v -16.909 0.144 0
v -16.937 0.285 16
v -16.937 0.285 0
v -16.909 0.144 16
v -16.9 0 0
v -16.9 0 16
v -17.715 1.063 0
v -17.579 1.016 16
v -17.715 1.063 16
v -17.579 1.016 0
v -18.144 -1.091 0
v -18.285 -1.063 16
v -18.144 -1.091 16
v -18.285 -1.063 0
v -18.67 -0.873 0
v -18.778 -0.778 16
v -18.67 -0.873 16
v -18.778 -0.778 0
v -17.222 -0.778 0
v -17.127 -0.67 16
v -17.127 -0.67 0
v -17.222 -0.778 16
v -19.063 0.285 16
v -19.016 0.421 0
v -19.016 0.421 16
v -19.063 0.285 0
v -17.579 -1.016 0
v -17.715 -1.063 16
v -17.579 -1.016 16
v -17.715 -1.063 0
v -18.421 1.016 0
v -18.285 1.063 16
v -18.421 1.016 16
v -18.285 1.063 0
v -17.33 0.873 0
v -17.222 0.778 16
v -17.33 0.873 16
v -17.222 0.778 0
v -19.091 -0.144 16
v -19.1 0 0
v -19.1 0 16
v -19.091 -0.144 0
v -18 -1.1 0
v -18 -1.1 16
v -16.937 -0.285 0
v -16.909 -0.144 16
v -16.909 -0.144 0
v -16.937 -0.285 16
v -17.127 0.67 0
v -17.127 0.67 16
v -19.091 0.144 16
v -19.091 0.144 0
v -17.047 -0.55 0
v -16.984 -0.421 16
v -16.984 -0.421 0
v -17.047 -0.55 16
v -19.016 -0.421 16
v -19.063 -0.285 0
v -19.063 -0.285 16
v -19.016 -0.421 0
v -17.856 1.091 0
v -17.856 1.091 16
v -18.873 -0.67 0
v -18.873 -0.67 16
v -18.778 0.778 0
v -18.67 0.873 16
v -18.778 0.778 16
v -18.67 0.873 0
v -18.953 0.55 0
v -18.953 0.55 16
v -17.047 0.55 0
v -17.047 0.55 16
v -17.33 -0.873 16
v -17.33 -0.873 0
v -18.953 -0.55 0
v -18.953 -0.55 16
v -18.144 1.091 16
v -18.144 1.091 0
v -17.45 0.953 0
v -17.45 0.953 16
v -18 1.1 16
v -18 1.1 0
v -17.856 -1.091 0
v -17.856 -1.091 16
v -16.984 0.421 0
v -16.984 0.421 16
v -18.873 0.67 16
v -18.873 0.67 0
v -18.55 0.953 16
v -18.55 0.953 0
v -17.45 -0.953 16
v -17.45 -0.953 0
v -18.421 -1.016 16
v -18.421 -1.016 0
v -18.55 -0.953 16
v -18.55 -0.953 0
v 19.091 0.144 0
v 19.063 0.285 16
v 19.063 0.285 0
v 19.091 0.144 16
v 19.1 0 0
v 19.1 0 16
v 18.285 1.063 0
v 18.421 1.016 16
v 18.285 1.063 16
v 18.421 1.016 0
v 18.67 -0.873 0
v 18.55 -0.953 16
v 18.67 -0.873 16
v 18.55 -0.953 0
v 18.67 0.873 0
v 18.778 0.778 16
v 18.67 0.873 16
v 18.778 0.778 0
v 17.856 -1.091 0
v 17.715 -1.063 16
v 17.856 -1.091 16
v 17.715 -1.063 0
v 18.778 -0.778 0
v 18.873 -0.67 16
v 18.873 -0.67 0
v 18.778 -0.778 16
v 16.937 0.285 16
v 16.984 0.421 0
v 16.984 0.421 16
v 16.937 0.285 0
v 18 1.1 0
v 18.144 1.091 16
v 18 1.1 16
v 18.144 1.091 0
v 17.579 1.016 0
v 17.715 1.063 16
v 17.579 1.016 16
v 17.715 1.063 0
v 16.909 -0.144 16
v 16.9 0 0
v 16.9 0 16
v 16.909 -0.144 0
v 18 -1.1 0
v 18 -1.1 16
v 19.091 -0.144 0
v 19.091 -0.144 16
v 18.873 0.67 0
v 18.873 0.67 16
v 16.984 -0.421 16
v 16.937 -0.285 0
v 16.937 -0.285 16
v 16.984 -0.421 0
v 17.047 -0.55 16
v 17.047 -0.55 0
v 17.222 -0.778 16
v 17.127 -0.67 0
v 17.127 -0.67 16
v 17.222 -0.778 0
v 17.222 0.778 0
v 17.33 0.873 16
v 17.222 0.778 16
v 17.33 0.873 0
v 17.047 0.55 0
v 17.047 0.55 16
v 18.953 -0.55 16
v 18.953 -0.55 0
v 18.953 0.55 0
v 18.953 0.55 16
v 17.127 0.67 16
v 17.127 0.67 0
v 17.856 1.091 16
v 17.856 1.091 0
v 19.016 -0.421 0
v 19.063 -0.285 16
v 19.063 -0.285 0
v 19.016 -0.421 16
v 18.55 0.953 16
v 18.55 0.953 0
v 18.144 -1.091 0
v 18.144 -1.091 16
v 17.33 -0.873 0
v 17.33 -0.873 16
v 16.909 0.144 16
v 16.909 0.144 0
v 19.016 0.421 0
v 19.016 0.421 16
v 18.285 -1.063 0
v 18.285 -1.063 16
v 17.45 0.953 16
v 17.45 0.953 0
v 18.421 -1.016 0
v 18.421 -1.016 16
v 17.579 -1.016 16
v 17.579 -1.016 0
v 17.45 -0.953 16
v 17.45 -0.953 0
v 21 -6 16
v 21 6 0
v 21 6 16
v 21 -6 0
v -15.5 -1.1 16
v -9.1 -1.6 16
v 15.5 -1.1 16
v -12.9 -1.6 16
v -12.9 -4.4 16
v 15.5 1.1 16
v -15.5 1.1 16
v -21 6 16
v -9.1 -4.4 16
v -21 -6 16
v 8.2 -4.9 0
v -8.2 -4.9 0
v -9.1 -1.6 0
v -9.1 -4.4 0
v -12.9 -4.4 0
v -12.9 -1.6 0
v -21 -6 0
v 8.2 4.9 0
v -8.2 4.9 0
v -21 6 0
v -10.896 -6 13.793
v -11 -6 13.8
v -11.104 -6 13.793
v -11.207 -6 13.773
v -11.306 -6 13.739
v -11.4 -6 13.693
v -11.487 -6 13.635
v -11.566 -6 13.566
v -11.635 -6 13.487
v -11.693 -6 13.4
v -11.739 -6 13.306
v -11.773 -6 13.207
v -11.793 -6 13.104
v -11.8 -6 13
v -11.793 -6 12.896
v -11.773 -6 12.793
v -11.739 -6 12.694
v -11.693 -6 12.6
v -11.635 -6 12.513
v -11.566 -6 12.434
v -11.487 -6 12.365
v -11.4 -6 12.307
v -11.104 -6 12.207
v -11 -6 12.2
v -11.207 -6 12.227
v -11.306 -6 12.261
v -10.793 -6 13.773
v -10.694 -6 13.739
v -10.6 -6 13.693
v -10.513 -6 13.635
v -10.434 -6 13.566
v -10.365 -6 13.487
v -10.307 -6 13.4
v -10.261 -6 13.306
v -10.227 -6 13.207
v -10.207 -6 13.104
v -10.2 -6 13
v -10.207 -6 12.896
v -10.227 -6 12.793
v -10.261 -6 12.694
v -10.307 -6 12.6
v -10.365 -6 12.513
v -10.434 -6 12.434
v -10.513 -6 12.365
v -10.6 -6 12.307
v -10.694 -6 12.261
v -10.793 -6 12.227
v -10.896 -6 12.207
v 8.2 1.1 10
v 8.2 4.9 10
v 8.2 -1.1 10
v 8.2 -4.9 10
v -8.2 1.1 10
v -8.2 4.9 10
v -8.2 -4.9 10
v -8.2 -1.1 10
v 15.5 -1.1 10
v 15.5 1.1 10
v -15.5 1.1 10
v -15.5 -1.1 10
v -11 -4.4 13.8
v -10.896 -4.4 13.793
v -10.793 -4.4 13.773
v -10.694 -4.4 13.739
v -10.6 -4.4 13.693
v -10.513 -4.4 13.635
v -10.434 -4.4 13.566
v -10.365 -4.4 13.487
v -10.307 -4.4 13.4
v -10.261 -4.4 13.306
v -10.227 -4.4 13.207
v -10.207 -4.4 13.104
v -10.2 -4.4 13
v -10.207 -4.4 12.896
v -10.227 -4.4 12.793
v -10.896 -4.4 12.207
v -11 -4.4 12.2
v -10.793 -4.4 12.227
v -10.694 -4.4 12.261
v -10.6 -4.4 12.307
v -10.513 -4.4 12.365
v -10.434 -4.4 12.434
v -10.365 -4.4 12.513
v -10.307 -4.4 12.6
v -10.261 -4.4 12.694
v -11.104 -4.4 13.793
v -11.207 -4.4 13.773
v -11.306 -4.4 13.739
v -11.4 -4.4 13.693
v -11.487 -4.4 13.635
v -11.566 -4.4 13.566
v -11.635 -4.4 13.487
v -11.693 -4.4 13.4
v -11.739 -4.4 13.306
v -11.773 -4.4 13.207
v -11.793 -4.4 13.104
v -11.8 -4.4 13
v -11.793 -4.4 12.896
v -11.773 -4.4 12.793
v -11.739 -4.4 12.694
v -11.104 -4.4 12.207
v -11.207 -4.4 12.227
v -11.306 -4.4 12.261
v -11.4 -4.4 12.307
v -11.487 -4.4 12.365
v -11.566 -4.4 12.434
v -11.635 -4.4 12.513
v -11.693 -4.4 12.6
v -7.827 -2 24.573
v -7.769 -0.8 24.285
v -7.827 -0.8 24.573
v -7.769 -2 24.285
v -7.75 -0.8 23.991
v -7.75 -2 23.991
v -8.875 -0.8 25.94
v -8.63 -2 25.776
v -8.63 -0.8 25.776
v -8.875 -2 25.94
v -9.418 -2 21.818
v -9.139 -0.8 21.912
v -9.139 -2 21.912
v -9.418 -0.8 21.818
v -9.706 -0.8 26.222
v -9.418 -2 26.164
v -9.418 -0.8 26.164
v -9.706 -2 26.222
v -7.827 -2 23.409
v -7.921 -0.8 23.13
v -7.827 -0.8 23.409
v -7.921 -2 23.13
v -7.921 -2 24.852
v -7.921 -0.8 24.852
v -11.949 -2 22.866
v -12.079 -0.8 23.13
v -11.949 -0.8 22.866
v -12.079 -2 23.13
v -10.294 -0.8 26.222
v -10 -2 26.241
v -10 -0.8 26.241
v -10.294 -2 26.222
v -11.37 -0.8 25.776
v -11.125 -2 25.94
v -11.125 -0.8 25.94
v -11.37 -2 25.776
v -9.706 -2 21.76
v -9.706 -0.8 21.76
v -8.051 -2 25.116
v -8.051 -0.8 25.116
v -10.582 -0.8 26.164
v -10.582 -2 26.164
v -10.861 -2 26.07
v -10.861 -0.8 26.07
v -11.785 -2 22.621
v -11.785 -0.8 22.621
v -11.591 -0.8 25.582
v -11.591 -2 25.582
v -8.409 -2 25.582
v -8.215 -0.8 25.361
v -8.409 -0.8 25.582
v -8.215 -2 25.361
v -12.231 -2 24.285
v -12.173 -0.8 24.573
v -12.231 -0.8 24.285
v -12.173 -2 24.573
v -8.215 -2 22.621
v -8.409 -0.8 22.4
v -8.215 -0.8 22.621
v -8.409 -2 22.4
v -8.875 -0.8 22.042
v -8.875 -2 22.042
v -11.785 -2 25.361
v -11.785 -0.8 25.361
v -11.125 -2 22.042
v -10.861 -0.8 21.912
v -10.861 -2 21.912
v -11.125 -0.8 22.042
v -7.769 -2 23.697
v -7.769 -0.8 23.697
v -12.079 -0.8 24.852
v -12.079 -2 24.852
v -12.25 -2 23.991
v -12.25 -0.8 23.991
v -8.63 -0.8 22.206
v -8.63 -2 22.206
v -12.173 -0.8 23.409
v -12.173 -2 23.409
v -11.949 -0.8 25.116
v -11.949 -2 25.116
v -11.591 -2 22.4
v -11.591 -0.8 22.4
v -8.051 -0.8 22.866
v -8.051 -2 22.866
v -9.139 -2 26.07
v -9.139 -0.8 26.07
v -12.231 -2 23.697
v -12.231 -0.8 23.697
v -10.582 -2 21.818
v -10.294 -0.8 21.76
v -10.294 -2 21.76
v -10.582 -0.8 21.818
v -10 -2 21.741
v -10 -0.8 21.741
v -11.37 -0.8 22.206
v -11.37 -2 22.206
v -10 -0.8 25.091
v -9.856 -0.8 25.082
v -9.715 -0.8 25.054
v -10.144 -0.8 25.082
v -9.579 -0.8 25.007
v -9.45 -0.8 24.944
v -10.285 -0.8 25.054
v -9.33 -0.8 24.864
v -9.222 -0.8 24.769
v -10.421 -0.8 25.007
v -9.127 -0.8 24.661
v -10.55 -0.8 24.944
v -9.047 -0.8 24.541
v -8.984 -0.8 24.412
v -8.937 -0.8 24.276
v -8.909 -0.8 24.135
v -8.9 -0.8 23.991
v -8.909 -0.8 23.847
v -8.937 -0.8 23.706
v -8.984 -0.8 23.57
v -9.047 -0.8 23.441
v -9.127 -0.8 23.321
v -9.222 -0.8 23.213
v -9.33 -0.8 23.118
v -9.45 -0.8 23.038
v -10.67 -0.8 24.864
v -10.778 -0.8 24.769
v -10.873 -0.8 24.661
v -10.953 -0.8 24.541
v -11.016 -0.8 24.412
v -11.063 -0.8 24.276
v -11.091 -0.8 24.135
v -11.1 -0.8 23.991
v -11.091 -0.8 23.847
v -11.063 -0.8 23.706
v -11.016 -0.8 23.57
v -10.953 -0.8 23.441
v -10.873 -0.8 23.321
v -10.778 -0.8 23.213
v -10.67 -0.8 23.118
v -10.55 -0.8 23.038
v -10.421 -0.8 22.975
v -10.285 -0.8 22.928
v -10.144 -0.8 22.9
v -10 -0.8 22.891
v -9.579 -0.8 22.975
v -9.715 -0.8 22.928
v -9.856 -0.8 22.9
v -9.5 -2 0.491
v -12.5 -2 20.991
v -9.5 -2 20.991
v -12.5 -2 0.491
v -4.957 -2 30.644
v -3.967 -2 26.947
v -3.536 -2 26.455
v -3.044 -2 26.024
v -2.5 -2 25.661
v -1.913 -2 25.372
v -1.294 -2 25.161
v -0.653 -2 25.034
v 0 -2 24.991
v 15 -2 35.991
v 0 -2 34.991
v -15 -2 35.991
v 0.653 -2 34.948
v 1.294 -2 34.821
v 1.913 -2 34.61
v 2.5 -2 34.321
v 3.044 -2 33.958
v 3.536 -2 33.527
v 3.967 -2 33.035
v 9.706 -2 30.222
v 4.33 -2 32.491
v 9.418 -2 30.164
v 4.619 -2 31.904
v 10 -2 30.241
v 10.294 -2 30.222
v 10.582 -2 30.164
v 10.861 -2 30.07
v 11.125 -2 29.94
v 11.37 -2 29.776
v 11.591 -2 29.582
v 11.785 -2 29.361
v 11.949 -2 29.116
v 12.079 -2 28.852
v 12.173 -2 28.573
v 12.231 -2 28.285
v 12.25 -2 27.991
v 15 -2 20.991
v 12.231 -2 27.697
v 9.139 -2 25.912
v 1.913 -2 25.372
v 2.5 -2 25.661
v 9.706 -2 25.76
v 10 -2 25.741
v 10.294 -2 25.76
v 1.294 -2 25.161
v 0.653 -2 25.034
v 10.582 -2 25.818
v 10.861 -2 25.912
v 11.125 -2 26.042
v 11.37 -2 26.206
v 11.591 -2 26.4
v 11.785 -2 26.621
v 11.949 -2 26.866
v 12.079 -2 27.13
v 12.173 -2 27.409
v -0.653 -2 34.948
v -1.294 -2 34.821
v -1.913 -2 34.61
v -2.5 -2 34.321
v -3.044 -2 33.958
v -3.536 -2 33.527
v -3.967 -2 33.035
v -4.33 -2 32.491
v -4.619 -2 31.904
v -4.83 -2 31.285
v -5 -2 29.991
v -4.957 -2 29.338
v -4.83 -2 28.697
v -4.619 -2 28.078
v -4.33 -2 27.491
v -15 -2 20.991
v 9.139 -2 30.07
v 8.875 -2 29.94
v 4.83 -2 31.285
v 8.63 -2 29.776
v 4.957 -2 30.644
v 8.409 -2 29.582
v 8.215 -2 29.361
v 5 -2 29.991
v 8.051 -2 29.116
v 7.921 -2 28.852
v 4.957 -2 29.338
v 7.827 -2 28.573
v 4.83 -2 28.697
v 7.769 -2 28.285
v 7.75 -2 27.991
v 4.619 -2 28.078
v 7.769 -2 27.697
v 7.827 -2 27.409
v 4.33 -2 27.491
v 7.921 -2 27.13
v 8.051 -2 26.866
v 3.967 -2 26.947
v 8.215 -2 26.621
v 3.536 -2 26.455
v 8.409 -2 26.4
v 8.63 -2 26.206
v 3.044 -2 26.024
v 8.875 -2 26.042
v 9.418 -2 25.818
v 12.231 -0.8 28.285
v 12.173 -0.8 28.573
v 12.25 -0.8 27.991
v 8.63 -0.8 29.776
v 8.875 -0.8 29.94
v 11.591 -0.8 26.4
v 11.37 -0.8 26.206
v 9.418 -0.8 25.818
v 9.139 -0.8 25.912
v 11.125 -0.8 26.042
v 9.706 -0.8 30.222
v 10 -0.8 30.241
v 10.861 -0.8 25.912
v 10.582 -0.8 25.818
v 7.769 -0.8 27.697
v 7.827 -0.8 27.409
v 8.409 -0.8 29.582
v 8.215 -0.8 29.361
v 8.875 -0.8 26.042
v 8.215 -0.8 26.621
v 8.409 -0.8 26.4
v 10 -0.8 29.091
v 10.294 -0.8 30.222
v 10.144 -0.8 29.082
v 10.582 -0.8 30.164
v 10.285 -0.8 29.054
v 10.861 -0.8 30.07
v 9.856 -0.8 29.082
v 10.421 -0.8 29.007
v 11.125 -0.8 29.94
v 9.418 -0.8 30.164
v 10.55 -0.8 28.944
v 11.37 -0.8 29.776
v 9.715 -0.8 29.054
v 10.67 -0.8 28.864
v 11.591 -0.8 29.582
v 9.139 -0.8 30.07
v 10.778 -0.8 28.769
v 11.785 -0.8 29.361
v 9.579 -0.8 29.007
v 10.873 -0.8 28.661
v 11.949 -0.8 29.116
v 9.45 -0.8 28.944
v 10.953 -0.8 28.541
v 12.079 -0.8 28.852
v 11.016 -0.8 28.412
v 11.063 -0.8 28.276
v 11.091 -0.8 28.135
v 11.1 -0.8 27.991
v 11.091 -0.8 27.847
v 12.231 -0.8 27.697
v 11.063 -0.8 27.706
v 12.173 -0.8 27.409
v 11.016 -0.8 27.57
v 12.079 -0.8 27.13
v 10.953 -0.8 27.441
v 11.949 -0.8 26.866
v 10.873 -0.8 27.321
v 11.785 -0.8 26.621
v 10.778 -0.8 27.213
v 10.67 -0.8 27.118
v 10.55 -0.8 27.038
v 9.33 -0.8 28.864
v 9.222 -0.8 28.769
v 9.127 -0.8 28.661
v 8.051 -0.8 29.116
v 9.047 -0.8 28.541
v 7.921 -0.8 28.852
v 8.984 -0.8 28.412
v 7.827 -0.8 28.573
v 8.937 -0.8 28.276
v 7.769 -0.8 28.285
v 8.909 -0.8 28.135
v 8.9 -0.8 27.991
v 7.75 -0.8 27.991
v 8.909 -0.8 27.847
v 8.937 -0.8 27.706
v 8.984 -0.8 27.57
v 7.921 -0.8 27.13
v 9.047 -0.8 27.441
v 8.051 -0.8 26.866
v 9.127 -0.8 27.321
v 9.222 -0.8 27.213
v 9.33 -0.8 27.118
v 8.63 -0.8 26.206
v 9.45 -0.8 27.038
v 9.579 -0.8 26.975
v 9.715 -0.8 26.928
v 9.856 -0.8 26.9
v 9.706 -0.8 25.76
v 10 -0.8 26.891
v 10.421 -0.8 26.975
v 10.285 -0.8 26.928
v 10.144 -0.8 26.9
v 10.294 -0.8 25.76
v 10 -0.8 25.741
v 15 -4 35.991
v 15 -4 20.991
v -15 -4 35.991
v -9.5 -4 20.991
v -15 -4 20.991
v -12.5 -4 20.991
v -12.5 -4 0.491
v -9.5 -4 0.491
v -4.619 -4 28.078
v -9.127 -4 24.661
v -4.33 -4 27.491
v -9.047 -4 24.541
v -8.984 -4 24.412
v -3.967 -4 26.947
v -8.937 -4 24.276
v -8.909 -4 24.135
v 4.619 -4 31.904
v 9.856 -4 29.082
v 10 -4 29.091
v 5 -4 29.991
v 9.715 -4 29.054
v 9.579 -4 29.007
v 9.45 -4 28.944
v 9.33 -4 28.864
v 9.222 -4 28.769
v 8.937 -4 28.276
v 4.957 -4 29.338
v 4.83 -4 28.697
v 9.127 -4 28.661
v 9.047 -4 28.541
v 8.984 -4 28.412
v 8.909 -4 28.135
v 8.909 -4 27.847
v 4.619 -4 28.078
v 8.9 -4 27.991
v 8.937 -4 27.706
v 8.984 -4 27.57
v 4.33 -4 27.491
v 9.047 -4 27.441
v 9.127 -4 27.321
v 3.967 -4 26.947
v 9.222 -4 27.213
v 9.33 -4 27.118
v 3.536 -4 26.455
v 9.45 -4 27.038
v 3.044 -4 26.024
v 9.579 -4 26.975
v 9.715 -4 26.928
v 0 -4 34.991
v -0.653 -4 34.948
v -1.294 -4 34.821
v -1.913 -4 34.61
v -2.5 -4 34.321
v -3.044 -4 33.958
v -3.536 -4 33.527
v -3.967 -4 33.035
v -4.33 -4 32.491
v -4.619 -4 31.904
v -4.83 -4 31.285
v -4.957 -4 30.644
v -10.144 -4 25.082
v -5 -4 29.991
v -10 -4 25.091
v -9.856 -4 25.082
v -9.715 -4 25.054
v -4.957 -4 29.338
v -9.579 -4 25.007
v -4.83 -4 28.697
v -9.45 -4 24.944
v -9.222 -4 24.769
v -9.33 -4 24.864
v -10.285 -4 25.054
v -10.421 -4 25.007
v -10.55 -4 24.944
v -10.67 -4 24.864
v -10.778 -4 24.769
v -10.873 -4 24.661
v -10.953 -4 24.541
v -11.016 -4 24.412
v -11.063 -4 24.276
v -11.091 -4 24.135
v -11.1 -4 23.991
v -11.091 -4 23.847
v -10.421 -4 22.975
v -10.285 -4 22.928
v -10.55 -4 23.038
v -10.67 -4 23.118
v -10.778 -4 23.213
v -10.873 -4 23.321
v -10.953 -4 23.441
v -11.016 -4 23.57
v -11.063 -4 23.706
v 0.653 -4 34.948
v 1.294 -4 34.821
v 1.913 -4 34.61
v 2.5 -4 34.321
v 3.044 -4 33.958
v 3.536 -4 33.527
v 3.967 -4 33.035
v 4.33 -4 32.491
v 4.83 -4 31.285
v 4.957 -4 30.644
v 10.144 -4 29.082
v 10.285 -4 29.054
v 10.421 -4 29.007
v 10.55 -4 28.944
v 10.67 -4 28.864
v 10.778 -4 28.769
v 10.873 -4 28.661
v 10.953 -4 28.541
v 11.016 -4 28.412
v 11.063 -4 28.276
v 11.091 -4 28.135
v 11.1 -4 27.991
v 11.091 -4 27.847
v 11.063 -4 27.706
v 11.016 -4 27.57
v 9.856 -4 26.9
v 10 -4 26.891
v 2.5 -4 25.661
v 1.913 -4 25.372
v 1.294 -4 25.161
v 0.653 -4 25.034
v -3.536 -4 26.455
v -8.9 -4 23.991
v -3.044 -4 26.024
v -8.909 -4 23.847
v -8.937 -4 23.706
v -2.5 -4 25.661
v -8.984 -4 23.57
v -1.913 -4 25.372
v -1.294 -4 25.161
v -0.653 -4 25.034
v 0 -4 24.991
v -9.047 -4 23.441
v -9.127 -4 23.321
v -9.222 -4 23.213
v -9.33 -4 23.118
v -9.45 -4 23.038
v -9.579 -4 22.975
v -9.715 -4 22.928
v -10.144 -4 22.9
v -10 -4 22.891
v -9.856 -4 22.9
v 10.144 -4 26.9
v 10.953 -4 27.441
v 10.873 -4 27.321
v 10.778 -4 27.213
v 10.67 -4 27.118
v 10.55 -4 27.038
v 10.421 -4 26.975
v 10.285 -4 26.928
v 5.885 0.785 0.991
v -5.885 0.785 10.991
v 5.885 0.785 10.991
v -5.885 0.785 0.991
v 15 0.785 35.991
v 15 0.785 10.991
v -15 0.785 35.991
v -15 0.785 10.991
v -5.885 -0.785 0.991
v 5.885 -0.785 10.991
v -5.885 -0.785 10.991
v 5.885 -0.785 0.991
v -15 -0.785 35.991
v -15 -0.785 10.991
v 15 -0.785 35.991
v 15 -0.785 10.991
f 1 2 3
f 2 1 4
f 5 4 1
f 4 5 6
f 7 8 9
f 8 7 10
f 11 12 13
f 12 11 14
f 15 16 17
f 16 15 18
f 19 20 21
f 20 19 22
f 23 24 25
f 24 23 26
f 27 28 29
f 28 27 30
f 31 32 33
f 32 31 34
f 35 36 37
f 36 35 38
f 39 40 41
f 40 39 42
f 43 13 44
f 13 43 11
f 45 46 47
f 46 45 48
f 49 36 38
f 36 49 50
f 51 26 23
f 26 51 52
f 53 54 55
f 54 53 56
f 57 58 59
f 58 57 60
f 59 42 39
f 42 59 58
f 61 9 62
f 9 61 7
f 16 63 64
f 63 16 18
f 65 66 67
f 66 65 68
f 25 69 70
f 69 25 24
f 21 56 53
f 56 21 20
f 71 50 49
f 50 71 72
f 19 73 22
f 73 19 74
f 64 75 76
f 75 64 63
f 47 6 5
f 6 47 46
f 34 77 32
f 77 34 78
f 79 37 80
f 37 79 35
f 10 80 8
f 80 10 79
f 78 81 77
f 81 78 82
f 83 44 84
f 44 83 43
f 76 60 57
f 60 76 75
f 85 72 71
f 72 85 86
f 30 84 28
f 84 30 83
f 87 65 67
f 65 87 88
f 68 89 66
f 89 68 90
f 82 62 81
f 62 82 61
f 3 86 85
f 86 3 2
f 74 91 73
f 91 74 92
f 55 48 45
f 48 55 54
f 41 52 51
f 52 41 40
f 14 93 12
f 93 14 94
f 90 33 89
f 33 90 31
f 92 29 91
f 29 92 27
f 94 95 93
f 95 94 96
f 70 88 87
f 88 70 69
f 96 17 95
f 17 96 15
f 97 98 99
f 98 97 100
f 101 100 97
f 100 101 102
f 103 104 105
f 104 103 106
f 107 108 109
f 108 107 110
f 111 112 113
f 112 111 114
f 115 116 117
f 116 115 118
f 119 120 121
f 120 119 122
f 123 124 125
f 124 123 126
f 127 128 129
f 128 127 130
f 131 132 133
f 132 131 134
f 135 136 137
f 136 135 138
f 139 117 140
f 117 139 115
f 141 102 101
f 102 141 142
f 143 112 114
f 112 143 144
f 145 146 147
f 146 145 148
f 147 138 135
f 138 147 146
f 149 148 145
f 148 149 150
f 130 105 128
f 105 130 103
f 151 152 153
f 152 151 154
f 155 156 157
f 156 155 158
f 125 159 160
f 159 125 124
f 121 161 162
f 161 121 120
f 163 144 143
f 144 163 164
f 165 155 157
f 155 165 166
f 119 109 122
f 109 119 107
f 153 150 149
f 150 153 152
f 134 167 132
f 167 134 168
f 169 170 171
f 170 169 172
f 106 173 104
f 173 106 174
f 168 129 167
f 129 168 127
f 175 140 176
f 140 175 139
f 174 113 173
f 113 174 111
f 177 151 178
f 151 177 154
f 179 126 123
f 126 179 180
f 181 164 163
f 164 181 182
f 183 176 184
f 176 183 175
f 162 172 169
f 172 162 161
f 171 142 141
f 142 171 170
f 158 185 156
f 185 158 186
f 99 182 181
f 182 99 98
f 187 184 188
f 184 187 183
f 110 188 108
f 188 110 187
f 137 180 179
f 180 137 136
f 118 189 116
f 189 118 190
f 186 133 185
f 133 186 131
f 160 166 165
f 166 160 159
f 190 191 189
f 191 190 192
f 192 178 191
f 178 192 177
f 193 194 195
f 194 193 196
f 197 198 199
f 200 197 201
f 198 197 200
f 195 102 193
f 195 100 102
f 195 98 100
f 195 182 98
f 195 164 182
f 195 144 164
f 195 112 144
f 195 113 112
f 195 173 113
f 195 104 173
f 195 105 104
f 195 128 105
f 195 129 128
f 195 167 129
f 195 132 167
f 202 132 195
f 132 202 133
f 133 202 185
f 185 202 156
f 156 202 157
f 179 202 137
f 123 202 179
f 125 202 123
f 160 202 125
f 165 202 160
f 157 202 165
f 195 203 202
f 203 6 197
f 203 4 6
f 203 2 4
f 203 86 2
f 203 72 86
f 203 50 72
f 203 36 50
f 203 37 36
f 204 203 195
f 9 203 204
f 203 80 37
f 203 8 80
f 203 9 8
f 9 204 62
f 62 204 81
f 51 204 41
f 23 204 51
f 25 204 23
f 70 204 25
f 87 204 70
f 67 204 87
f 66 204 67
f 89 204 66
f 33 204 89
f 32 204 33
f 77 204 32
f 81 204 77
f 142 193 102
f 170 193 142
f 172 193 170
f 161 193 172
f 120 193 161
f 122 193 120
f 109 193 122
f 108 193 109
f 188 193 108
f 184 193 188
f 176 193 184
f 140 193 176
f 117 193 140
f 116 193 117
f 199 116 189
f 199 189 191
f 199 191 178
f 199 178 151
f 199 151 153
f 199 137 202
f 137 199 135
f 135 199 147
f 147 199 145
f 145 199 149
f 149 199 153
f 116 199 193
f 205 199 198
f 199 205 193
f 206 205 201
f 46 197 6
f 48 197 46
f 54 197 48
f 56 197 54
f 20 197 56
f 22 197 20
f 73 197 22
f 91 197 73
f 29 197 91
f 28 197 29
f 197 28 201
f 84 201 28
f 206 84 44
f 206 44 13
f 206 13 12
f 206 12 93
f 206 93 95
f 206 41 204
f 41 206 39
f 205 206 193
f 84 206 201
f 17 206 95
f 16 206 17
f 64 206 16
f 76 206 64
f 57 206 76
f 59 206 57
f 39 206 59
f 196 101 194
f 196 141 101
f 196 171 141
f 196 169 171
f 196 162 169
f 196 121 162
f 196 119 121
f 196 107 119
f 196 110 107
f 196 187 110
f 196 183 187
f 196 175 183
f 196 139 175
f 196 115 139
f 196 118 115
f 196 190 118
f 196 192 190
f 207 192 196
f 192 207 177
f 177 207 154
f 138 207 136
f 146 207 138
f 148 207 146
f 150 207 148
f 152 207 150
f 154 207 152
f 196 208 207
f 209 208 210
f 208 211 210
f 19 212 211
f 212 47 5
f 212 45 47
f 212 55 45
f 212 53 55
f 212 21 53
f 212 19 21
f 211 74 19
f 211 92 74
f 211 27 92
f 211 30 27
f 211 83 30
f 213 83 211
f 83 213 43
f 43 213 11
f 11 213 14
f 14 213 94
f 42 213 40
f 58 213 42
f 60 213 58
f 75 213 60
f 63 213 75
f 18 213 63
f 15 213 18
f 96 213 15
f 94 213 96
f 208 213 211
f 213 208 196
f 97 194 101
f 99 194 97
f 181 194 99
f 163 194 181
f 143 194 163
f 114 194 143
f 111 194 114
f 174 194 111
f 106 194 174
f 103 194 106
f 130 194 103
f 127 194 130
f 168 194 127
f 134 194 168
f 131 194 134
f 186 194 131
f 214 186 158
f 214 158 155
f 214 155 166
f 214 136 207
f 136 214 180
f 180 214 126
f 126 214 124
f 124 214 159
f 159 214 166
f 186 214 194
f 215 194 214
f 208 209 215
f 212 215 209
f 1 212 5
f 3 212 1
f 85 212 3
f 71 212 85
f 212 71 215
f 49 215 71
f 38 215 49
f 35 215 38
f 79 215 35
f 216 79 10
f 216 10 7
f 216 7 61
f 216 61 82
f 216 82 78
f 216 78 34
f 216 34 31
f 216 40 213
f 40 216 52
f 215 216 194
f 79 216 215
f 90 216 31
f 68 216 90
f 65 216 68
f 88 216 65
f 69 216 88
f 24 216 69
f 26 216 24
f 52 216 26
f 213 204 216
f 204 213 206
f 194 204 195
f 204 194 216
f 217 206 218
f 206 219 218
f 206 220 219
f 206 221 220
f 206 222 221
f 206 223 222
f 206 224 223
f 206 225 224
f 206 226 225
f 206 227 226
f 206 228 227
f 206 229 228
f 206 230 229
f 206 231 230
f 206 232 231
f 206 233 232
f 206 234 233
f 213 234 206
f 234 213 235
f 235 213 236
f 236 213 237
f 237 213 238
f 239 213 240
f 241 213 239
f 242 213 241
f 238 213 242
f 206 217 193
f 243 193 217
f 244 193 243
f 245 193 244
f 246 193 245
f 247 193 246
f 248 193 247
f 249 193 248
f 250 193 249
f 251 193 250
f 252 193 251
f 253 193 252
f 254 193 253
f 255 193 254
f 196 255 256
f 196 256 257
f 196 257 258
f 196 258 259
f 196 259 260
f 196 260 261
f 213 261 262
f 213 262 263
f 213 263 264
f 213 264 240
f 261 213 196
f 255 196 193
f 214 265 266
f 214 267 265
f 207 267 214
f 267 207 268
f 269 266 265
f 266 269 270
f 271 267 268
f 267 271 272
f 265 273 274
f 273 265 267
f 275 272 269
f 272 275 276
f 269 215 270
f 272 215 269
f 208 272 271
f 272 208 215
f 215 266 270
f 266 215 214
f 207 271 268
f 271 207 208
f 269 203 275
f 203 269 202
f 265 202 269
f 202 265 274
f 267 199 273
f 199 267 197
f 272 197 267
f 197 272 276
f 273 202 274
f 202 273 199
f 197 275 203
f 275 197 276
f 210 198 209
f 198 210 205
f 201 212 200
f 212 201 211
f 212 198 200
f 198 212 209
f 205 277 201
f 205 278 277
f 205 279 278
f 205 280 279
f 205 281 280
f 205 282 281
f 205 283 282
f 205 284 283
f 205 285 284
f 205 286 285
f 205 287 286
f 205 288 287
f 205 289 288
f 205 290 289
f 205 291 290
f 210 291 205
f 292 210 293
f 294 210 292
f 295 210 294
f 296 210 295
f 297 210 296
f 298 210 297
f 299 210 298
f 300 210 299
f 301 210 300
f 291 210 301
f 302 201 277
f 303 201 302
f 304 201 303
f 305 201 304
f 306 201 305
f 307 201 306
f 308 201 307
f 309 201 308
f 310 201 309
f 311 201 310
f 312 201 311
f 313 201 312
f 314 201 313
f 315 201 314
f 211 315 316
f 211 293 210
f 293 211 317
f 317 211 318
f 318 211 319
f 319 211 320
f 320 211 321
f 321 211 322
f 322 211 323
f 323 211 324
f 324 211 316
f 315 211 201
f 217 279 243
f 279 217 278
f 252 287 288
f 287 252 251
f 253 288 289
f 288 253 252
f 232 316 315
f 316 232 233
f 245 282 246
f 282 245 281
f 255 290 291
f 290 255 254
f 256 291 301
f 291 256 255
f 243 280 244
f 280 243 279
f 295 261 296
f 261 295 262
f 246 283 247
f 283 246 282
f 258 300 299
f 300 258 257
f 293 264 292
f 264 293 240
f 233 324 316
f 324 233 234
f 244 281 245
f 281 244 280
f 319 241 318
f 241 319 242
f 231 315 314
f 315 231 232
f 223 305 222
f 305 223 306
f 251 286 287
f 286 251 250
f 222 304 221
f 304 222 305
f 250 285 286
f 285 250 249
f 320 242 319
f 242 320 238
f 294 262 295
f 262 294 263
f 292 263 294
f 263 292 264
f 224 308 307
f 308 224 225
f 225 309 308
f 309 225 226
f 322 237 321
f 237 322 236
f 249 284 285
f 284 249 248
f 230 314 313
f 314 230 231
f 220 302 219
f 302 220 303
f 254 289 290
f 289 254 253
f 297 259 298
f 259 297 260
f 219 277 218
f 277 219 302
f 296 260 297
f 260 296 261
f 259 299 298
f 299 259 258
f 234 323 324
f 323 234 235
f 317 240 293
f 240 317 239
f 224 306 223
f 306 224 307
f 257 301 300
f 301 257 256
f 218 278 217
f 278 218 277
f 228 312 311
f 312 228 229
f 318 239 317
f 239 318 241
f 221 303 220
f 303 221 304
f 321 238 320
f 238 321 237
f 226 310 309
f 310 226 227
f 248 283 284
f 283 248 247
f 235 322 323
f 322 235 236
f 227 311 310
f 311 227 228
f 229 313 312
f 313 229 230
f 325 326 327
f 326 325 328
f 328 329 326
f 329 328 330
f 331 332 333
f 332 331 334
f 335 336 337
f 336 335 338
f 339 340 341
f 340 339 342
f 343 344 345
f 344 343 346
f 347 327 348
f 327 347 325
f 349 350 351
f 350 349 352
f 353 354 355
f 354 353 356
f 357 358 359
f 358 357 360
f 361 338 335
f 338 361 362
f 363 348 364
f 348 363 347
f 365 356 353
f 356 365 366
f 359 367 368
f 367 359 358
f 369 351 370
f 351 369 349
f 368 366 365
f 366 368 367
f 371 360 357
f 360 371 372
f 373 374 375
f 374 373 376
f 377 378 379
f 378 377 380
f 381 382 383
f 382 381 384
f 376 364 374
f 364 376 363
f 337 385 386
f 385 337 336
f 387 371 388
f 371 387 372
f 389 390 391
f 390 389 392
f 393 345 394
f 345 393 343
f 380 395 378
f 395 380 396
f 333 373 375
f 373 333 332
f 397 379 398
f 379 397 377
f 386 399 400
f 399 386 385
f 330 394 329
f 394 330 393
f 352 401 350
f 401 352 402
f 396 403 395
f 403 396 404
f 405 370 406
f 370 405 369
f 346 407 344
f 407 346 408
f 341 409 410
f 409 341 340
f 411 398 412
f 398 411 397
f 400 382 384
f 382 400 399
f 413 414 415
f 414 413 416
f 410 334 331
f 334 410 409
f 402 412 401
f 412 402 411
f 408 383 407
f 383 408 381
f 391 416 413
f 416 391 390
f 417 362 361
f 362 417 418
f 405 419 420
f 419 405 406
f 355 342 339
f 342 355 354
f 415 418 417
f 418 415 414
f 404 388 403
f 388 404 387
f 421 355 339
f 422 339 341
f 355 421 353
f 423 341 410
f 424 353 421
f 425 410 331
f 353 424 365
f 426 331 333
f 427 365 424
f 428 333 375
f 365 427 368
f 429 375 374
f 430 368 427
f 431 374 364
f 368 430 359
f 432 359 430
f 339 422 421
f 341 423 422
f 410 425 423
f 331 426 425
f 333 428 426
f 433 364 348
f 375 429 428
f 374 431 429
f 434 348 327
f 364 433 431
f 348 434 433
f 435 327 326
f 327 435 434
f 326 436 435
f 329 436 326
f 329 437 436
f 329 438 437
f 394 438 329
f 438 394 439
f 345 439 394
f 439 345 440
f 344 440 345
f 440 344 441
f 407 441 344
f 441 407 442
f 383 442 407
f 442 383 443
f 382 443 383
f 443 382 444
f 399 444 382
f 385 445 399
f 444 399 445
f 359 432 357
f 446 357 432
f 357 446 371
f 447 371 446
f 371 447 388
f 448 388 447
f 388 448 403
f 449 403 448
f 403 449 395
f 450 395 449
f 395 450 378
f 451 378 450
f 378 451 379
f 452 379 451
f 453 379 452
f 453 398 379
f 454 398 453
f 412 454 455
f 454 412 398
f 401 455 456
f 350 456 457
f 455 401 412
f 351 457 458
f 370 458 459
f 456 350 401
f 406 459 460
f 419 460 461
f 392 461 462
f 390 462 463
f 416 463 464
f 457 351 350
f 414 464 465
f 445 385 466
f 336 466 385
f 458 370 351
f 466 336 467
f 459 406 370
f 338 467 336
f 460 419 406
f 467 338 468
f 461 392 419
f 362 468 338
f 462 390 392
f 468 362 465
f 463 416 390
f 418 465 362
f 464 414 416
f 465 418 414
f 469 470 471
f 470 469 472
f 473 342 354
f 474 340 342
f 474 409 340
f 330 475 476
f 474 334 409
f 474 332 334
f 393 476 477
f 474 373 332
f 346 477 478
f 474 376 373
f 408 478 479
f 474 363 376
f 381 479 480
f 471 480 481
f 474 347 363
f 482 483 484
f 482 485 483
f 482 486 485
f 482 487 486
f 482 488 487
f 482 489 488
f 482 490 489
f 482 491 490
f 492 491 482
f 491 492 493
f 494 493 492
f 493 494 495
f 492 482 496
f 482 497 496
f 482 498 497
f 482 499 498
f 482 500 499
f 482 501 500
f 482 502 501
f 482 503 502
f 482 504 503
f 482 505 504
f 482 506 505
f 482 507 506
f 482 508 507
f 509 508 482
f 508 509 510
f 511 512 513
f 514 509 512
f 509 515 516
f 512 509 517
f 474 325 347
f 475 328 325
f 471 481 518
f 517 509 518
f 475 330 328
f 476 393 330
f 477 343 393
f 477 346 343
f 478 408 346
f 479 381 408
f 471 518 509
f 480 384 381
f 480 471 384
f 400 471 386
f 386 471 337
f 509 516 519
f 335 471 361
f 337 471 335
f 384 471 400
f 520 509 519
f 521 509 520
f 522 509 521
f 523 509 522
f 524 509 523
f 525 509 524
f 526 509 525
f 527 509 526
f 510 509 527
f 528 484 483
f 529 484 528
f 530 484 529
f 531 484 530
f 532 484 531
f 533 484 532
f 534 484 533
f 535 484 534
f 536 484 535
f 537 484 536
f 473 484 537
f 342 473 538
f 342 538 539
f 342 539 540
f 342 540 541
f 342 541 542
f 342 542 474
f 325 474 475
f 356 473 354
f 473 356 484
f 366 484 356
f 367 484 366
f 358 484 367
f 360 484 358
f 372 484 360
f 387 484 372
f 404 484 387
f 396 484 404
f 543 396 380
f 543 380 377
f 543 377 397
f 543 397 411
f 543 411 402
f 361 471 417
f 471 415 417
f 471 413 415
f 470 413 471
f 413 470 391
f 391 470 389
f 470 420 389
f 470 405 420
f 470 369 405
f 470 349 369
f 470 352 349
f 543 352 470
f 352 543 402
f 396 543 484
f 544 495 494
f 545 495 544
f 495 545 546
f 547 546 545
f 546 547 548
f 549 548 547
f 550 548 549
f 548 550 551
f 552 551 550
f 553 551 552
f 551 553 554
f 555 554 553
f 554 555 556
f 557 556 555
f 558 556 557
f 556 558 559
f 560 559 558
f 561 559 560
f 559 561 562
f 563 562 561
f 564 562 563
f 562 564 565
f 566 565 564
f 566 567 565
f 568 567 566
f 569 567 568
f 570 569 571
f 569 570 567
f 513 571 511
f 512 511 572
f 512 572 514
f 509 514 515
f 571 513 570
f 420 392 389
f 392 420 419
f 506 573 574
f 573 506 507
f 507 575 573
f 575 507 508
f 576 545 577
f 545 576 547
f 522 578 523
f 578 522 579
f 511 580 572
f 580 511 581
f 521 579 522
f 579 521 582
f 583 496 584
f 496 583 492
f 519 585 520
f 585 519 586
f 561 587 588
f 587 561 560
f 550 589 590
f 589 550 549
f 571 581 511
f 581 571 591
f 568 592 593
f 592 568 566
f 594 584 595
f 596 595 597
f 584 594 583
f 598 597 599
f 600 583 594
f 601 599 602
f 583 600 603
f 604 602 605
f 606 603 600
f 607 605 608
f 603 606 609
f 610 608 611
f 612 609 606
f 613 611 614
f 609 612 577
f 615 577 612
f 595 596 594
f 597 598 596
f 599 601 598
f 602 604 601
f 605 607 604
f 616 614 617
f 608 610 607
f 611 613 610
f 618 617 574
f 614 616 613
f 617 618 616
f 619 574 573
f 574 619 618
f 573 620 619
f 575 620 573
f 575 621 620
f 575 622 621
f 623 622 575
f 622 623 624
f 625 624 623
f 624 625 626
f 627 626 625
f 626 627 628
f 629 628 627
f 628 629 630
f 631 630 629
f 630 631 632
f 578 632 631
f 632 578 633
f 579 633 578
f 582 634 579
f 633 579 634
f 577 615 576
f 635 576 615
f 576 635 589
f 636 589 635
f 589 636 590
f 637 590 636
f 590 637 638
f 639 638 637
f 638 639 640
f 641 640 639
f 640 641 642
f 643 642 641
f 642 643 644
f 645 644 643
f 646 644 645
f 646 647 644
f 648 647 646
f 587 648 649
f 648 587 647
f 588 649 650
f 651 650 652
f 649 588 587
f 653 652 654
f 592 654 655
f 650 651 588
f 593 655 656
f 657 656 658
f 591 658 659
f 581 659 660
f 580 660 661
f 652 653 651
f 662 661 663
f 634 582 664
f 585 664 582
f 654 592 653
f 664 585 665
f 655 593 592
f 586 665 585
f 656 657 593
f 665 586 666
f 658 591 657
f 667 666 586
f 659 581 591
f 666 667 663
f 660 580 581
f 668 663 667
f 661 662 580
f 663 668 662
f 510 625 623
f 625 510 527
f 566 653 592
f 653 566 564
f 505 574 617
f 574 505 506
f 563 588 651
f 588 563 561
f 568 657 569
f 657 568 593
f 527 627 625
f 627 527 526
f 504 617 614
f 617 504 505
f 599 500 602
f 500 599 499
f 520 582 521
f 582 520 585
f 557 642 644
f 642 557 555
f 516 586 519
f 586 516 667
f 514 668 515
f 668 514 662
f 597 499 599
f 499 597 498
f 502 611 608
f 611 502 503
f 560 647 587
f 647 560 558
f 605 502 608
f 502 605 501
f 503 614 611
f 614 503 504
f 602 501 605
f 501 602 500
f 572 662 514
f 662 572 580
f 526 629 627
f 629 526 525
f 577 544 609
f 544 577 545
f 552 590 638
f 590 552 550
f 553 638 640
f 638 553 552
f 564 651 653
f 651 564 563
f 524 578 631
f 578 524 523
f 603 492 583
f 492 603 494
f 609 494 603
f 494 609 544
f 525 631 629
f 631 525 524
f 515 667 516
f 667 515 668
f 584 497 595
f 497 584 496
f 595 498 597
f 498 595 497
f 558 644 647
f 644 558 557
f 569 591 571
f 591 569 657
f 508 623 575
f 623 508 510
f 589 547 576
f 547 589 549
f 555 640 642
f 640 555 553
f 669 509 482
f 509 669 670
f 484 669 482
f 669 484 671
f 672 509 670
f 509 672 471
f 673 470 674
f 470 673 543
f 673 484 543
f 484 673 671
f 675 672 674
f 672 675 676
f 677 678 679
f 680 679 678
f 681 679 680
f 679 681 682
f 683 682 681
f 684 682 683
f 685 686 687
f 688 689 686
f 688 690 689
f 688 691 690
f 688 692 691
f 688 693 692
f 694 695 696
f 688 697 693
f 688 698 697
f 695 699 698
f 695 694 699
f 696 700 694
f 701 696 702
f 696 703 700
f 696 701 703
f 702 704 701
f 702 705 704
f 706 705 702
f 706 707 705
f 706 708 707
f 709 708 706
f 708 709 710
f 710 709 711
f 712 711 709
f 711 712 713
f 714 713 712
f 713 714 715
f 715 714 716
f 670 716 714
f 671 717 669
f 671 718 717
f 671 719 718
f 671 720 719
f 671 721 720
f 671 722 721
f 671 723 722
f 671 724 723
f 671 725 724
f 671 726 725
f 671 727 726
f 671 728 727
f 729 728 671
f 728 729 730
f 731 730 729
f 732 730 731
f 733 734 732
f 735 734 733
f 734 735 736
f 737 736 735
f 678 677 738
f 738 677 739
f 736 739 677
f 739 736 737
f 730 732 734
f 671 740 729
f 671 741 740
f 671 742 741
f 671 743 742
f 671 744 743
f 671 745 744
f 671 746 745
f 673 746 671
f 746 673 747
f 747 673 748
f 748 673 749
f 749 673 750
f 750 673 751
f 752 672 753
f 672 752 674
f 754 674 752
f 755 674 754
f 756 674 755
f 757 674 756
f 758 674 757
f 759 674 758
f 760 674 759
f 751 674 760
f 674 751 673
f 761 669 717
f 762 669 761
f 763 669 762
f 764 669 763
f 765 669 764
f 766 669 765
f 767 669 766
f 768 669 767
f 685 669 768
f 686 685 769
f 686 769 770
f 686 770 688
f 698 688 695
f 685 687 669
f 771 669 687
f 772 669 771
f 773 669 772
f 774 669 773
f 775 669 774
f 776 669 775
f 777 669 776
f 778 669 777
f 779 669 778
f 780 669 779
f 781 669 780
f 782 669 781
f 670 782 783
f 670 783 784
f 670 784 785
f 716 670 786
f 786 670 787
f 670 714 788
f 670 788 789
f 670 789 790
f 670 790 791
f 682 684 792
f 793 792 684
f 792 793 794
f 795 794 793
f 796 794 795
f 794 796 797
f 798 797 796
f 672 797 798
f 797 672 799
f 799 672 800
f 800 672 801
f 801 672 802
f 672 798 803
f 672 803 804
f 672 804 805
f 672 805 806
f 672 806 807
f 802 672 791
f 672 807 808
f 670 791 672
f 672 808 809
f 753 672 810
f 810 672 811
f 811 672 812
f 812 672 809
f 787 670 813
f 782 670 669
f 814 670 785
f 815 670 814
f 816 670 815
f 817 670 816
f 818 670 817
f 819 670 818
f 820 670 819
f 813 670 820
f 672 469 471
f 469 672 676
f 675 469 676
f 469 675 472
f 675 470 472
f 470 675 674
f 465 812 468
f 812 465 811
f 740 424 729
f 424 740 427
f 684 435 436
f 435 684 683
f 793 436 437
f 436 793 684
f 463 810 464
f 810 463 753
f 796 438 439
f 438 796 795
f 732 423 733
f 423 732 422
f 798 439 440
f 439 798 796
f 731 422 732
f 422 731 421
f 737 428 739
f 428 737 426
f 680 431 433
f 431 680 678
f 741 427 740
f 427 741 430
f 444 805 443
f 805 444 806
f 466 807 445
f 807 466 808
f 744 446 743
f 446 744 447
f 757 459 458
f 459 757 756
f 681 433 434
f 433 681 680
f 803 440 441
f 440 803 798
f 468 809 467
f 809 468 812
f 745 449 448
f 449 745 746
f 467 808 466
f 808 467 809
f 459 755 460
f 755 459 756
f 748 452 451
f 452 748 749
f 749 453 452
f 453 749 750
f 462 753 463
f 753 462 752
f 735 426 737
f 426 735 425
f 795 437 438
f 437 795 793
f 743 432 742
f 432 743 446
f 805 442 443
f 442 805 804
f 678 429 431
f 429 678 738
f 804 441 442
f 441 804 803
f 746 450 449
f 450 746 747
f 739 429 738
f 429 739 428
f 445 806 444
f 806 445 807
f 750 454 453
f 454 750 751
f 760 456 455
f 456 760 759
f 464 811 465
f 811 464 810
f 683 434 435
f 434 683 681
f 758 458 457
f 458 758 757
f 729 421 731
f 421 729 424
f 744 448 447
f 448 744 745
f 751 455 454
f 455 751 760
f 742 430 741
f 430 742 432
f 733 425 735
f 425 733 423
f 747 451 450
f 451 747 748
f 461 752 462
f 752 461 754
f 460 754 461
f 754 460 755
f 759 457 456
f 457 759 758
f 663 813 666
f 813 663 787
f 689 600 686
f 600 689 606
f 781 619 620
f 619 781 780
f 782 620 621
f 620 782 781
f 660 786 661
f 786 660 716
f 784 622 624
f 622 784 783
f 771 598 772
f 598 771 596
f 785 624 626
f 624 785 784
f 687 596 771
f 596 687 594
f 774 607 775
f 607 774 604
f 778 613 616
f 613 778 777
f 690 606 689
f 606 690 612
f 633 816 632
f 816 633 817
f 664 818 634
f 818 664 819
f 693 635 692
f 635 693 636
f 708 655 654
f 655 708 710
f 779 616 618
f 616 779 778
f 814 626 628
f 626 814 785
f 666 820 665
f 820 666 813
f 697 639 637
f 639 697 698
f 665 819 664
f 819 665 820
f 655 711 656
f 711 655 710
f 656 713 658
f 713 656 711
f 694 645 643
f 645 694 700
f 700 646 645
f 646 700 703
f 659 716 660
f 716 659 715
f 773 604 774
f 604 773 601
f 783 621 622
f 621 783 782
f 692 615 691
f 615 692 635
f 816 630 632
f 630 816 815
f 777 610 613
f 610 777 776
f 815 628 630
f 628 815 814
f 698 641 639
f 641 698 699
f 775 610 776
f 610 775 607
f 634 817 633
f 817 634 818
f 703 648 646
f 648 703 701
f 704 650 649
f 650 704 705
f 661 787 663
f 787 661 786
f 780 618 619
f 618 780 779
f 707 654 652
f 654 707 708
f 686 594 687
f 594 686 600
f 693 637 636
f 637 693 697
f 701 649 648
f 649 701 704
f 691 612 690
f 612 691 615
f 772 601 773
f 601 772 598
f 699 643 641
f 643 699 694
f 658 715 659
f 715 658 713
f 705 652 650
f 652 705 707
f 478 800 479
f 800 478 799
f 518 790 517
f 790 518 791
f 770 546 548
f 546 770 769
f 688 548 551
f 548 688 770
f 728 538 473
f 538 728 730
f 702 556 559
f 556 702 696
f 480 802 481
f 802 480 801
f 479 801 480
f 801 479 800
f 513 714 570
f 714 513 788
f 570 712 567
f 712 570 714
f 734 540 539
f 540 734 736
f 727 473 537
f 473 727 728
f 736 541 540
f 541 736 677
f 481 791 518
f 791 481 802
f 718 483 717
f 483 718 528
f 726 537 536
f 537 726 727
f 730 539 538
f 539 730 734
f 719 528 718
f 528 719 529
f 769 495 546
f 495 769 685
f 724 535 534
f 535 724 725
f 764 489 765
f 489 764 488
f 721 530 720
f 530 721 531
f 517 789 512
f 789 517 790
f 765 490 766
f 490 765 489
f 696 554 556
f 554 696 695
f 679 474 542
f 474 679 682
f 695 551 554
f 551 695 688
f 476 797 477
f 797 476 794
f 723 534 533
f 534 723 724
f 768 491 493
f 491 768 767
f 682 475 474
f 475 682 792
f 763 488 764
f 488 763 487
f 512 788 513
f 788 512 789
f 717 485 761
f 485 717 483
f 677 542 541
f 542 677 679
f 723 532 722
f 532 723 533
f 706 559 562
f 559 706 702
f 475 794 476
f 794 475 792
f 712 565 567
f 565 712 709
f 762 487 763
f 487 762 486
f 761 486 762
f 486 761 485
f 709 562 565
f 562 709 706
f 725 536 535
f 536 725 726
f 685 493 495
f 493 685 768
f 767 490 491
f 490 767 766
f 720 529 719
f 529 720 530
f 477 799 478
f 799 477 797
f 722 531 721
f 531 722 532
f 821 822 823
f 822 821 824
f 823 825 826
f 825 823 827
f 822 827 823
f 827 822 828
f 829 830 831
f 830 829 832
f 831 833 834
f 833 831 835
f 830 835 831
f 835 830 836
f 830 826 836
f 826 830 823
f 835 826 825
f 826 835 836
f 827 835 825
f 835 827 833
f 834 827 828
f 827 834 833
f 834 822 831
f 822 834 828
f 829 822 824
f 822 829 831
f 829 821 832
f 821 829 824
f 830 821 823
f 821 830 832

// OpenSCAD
// Parametric prototype guide; mm. Reference host top = z0, socket centered x/y0.
// Select "boot", "carrier", or "assembly". Render/print a fit coupon before use.
part = "assembly";
$fn = 48;
tip_z = 0.991; // Samtec MEC1 fully-mated card-tip height above host PCB
pcb_t = 1.57;
module along_y(d,h) { rotate([90,0,0]) cylinder(d=d,h=h,center=true); }

module boot() {
  difference() {
    translate([-21,-6,0]) cube([42,12,16]);
    // Socket body/tails clear; only a guide, never an insertion-depth stop.
    translate([-8.2,-4.9,-.1]) cube([16.4,9.8,10.1]);
    translate([-6.2,-1.1,0]) cube([12.4,2.2,16.1]);
    translate([-15.5,-1.1,10]) cube([31,2.2,6.1]);
    // Asymmetric rear key slot: reversed carrier has no matching front slot.
    translate([-12.9,-4.4,-.1]) cube([3.8,2.8,16.2]);
    for(x=[-18,18]) translate([x,0,-.1]) cylinder(d=2.2,h=16.2);
    // Rear M2 nylon clamp screw; thread/tap only this boot wall, not the PCB.
    translate([-11,-5.4,13]) along_y(1.6,2);
  }
}
module carrier() {
  difference() {
    union() {
      translate([-15,-4,20]) cube([30,2,15]);
      // Key leads the electrical tongue by 0.5 mm, remaining clear of host PCB.
      translate([-12.5,-4,-.5]) cube([3,2,24.5]);
      for(p=[[-10,23],[10,27]]) translate([p[0],-1.4,p[1]]) along_y(4.5,1.2);
    }
    for(p=[[-10,23],[10,27]]) translate([p[0],-2,p[1]]) along_y(2.2,6);
    // Air/thermal relief behind the IR sensor. Front optical cone is unobstructed.
    translate([0,-3,29]) along_y(10,8);
  }
}
if(part=="boot") boot();
if(part=="carrier") carrier();
if(part=="assembly") {
  color("gray") boot();
  translate([0,0,tip_z]) color("orange") carrier();
  translate([0,0,tip_z]) color([0,0.5,0,0.5]) rotate([90,0,0])
    linear_extrude(height=pcb_t,center=true)
      polygon([[-5.885,0],[5.885,0],[5.885,10],[15,10],[15,35],[-15,35],[-15,10],[-5.885,10]]);
}
